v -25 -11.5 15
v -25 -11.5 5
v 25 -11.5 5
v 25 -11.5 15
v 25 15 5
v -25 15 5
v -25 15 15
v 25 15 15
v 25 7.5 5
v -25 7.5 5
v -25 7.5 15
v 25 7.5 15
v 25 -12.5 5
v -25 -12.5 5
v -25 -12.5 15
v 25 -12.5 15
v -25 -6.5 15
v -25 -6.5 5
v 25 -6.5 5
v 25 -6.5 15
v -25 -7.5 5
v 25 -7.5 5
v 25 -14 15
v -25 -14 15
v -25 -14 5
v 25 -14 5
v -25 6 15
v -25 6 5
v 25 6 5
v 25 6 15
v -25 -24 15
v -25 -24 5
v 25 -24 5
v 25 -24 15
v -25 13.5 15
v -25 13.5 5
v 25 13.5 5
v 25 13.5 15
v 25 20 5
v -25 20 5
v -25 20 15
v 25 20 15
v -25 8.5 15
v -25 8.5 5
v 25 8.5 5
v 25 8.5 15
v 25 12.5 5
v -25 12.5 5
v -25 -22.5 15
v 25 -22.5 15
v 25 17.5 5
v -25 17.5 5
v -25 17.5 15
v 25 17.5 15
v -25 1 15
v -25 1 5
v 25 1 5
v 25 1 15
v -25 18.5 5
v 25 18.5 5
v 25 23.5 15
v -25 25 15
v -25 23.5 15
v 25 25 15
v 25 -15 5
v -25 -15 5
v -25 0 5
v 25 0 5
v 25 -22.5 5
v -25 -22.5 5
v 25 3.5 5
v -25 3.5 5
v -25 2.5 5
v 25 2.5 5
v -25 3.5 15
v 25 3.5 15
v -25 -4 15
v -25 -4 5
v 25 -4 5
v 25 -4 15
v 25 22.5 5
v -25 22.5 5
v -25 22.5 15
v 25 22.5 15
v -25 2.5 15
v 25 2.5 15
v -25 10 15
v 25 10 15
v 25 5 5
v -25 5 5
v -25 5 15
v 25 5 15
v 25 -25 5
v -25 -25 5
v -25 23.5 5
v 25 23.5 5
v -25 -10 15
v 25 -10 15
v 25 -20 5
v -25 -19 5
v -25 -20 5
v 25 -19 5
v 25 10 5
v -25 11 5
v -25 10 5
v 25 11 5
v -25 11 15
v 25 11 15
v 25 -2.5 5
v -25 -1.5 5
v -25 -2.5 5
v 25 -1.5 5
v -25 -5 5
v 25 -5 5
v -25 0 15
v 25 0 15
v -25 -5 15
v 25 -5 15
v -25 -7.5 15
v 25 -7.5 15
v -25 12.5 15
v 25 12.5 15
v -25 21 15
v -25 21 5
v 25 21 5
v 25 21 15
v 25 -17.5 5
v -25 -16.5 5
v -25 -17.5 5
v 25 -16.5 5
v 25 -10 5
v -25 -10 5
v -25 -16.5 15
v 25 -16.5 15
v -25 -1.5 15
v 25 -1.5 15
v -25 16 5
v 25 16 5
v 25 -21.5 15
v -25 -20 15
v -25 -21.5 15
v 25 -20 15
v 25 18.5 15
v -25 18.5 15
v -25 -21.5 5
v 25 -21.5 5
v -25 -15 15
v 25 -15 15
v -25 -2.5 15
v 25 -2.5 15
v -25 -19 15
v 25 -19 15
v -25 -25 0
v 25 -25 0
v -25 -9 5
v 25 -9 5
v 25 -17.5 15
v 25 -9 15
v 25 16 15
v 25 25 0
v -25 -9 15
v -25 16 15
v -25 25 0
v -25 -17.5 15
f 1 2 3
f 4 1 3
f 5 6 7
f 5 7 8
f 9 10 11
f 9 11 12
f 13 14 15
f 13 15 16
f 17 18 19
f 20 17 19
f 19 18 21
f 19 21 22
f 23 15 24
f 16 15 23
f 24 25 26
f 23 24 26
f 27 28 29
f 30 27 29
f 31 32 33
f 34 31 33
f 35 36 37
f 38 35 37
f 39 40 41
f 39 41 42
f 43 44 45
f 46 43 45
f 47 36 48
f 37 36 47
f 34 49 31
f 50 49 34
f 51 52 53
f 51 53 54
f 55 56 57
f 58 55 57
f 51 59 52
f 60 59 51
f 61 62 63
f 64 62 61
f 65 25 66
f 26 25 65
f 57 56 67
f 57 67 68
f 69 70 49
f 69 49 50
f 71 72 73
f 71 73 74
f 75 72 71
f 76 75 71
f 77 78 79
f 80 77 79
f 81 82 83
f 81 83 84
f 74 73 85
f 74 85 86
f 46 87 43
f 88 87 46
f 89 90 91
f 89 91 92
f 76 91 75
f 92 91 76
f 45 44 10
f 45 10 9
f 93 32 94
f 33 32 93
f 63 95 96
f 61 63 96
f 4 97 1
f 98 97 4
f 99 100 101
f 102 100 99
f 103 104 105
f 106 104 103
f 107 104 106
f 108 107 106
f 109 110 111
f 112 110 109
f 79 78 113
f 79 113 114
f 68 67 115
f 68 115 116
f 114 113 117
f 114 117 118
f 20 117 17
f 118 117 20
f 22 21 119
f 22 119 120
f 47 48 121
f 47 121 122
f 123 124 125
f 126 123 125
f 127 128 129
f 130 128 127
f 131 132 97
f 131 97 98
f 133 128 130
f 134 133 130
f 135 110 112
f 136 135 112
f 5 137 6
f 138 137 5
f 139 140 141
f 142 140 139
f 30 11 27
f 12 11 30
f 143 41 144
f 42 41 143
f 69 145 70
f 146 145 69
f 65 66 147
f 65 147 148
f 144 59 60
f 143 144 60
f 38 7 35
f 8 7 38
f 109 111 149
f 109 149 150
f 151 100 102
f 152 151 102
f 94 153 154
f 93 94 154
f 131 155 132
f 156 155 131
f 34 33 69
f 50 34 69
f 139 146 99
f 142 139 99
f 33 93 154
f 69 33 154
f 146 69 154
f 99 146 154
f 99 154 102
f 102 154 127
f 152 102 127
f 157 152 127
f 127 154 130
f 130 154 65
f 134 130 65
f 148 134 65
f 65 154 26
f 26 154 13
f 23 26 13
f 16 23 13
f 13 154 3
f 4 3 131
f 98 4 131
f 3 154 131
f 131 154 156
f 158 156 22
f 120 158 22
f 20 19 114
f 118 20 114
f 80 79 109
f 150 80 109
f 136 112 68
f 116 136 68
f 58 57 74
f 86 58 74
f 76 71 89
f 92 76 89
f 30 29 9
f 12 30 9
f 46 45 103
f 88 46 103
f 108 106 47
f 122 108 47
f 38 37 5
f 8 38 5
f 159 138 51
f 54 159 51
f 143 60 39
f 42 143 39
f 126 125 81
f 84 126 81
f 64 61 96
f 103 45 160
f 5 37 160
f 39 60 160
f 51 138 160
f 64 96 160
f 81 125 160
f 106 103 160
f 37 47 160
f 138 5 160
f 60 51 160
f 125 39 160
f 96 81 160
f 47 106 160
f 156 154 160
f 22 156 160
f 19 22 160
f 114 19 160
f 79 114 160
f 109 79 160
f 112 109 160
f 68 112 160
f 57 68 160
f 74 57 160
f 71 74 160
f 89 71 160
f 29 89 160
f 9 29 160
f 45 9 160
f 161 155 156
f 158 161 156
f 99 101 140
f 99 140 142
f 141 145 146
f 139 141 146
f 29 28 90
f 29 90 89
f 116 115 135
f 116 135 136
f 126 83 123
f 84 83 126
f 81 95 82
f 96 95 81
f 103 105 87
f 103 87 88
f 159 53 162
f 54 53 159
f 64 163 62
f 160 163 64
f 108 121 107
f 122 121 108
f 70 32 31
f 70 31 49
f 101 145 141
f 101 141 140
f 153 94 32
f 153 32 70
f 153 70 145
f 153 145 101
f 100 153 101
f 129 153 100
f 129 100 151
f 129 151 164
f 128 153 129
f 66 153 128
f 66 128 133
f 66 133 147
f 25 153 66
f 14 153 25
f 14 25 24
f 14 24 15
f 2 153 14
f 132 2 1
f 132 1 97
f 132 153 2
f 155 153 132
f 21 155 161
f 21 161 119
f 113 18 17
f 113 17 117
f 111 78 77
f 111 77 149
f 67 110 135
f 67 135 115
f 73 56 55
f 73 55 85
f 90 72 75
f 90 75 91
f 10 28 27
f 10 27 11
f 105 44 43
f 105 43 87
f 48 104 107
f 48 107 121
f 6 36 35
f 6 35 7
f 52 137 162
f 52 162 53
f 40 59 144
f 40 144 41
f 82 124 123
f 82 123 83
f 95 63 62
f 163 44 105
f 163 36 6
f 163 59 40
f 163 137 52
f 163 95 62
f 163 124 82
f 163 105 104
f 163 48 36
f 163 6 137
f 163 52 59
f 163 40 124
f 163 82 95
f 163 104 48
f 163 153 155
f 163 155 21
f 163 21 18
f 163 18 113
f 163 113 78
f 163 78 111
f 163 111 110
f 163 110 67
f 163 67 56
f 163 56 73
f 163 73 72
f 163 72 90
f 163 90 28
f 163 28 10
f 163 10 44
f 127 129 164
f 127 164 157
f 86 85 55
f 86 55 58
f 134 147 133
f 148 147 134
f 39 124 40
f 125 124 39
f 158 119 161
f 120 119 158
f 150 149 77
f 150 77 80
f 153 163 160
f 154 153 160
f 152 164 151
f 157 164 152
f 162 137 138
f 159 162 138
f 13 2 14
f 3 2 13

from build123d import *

# Parameters (mm, degrees)
SKETCH1_W           = 50
SKETCH1_H           = 50
BOSS_EXTRUDE1_DEPTH = 5
SKETCH2_W           = 50
SKETCH2_H           = 1.5
BOSS_EXTRUDE2_DEPTH = 10


with BuildPart() as part:
    # Sketch1 → Boss-Extrude1 (new body)
    with BuildSketch(Plane.XY):
        Rectangle(SKETCH1_W, SKETCH1_H)
    extrude(amount=BOSS_EXTRUDE1_DEPTH)

    # Sketch2 → Boss-Extrude2 (add)
    with BuildSketch(Plane.XY.offset(5)):
        with Locations((0, 24.25)):
            Rectangle(SKETCH2_W, SKETCH2_H)
        with Locations((0, 21.75)):
            Rectangle(SKETCH2_W, SKETCH2_H)
        with Locations((0, 19.25)):
            Rectangle(SKETCH2_W, SKETCH2_H)
        with Locations((0, 16.75)):
            Rectangle(SKETCH2_W, SKETCH2_H)
        with Locations((0, 14.25)):
            Rectangle(SKETCH2_W, SKETCH2_H)
        with Locations((0, 11.75)):
            Rectangle(SKETCH2_W, SKETCH2_H)
        with Locations((0, 9.25)):
            Rectangle(SKETCH2_W, SKETCH2_H)
        with Locations((0, 6.75)):
            Rectangle(SKETCH2_W, SKETCH2_H)
        with Locations((0, 4.25)):
            Rectangle(SKETCH2_W, SKETCH2_H)
        with Locations((0, 1.75)):
            Rectangle(SKETCH2_W, SKETCH2_H)
        with Locations((0, -0.75)):
            Rectangle(SKETCH2_W, SKETCH2_H)
        with Locations((0, -3.25)):
            Rectangle(SKETCH2_W, SKETCH2_H)
        with Locations((0, -5.75)):
            Rectangle(SKETCH2_W, SKETCH2_H)
        with Locations((0, -8.25)):
            Rectangle(SKETCH2_W, SKETCH2_H)
        with Locations((0, -10.75)):
            Rectangle(SKETCH2_W, SKETCH2_H)
        with Locations((0, -13.25)):
            Rectangle(SKETCH2_W, SKETCH2_H)
        with Locations((0, -15.75)):
            Rectangle(SKETCH2_W, SKETCH2_H)
        with Locations((0, -18.25)):
            Rectangle(SKETCH2_W, SKETCH2_H)
        with Locations((0, -20.75)):
            Rectangle(SKETCH2_W, SKETCH2_H)
        with Locations((0, -23.25)):
            Rectangle(SKETCH2_W, SKETCH2_H)
    extrude(amount=BOSS_EXTRUDE2_DEPTH)


solid = part.part
